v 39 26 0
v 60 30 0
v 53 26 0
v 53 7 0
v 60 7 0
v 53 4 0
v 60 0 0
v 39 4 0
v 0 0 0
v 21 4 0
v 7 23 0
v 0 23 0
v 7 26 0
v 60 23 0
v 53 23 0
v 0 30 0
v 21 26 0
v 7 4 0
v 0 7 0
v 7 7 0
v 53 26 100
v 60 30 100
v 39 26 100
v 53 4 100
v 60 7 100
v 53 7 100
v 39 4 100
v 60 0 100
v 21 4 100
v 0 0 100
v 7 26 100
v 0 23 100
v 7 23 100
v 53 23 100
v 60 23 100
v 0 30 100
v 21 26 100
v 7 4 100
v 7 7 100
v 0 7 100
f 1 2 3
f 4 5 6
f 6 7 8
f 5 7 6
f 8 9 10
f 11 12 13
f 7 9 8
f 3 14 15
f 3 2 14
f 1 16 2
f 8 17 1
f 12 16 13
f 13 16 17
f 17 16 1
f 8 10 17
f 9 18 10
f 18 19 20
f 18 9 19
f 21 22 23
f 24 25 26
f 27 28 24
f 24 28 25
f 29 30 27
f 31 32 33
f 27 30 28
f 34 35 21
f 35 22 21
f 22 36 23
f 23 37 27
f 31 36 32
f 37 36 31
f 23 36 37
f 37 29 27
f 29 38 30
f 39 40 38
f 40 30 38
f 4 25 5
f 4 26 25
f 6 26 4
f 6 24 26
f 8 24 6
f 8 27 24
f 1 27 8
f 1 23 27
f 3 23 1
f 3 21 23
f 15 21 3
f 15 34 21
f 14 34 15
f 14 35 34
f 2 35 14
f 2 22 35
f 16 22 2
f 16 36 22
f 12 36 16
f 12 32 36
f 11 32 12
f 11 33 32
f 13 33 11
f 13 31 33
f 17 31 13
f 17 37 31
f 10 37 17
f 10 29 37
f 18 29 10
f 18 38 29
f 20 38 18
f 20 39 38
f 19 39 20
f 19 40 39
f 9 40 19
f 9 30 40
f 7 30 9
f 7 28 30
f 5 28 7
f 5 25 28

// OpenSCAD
$fn = 32;

// ----------------------------------------------------------------------
// T-slot rail: 60 x 30 mm section, 100 mm long
// ----------------------------------------------------------------------

// --- parameters (mm) ---
profile_height = 100;     // extrusion height
profile_points = 20;      // points of the closed outline

profile = [[0, 0], [60, 0], [60, 7], [53, 7], [53, 4], [39, 4], [39, 26], [53, 26], [53, 23], [60, 23], [60, 30], [0, 30], [0, 23], [7, 23], [7, 26], [21, 26], [21, 4], [7, 4], [7, 7], [0, 7]];  // single closed polygon, 20 points, counter clockwise

// --- the one profile operation ---
linear_extrude(height = profile_height) polygon(points = profile);
